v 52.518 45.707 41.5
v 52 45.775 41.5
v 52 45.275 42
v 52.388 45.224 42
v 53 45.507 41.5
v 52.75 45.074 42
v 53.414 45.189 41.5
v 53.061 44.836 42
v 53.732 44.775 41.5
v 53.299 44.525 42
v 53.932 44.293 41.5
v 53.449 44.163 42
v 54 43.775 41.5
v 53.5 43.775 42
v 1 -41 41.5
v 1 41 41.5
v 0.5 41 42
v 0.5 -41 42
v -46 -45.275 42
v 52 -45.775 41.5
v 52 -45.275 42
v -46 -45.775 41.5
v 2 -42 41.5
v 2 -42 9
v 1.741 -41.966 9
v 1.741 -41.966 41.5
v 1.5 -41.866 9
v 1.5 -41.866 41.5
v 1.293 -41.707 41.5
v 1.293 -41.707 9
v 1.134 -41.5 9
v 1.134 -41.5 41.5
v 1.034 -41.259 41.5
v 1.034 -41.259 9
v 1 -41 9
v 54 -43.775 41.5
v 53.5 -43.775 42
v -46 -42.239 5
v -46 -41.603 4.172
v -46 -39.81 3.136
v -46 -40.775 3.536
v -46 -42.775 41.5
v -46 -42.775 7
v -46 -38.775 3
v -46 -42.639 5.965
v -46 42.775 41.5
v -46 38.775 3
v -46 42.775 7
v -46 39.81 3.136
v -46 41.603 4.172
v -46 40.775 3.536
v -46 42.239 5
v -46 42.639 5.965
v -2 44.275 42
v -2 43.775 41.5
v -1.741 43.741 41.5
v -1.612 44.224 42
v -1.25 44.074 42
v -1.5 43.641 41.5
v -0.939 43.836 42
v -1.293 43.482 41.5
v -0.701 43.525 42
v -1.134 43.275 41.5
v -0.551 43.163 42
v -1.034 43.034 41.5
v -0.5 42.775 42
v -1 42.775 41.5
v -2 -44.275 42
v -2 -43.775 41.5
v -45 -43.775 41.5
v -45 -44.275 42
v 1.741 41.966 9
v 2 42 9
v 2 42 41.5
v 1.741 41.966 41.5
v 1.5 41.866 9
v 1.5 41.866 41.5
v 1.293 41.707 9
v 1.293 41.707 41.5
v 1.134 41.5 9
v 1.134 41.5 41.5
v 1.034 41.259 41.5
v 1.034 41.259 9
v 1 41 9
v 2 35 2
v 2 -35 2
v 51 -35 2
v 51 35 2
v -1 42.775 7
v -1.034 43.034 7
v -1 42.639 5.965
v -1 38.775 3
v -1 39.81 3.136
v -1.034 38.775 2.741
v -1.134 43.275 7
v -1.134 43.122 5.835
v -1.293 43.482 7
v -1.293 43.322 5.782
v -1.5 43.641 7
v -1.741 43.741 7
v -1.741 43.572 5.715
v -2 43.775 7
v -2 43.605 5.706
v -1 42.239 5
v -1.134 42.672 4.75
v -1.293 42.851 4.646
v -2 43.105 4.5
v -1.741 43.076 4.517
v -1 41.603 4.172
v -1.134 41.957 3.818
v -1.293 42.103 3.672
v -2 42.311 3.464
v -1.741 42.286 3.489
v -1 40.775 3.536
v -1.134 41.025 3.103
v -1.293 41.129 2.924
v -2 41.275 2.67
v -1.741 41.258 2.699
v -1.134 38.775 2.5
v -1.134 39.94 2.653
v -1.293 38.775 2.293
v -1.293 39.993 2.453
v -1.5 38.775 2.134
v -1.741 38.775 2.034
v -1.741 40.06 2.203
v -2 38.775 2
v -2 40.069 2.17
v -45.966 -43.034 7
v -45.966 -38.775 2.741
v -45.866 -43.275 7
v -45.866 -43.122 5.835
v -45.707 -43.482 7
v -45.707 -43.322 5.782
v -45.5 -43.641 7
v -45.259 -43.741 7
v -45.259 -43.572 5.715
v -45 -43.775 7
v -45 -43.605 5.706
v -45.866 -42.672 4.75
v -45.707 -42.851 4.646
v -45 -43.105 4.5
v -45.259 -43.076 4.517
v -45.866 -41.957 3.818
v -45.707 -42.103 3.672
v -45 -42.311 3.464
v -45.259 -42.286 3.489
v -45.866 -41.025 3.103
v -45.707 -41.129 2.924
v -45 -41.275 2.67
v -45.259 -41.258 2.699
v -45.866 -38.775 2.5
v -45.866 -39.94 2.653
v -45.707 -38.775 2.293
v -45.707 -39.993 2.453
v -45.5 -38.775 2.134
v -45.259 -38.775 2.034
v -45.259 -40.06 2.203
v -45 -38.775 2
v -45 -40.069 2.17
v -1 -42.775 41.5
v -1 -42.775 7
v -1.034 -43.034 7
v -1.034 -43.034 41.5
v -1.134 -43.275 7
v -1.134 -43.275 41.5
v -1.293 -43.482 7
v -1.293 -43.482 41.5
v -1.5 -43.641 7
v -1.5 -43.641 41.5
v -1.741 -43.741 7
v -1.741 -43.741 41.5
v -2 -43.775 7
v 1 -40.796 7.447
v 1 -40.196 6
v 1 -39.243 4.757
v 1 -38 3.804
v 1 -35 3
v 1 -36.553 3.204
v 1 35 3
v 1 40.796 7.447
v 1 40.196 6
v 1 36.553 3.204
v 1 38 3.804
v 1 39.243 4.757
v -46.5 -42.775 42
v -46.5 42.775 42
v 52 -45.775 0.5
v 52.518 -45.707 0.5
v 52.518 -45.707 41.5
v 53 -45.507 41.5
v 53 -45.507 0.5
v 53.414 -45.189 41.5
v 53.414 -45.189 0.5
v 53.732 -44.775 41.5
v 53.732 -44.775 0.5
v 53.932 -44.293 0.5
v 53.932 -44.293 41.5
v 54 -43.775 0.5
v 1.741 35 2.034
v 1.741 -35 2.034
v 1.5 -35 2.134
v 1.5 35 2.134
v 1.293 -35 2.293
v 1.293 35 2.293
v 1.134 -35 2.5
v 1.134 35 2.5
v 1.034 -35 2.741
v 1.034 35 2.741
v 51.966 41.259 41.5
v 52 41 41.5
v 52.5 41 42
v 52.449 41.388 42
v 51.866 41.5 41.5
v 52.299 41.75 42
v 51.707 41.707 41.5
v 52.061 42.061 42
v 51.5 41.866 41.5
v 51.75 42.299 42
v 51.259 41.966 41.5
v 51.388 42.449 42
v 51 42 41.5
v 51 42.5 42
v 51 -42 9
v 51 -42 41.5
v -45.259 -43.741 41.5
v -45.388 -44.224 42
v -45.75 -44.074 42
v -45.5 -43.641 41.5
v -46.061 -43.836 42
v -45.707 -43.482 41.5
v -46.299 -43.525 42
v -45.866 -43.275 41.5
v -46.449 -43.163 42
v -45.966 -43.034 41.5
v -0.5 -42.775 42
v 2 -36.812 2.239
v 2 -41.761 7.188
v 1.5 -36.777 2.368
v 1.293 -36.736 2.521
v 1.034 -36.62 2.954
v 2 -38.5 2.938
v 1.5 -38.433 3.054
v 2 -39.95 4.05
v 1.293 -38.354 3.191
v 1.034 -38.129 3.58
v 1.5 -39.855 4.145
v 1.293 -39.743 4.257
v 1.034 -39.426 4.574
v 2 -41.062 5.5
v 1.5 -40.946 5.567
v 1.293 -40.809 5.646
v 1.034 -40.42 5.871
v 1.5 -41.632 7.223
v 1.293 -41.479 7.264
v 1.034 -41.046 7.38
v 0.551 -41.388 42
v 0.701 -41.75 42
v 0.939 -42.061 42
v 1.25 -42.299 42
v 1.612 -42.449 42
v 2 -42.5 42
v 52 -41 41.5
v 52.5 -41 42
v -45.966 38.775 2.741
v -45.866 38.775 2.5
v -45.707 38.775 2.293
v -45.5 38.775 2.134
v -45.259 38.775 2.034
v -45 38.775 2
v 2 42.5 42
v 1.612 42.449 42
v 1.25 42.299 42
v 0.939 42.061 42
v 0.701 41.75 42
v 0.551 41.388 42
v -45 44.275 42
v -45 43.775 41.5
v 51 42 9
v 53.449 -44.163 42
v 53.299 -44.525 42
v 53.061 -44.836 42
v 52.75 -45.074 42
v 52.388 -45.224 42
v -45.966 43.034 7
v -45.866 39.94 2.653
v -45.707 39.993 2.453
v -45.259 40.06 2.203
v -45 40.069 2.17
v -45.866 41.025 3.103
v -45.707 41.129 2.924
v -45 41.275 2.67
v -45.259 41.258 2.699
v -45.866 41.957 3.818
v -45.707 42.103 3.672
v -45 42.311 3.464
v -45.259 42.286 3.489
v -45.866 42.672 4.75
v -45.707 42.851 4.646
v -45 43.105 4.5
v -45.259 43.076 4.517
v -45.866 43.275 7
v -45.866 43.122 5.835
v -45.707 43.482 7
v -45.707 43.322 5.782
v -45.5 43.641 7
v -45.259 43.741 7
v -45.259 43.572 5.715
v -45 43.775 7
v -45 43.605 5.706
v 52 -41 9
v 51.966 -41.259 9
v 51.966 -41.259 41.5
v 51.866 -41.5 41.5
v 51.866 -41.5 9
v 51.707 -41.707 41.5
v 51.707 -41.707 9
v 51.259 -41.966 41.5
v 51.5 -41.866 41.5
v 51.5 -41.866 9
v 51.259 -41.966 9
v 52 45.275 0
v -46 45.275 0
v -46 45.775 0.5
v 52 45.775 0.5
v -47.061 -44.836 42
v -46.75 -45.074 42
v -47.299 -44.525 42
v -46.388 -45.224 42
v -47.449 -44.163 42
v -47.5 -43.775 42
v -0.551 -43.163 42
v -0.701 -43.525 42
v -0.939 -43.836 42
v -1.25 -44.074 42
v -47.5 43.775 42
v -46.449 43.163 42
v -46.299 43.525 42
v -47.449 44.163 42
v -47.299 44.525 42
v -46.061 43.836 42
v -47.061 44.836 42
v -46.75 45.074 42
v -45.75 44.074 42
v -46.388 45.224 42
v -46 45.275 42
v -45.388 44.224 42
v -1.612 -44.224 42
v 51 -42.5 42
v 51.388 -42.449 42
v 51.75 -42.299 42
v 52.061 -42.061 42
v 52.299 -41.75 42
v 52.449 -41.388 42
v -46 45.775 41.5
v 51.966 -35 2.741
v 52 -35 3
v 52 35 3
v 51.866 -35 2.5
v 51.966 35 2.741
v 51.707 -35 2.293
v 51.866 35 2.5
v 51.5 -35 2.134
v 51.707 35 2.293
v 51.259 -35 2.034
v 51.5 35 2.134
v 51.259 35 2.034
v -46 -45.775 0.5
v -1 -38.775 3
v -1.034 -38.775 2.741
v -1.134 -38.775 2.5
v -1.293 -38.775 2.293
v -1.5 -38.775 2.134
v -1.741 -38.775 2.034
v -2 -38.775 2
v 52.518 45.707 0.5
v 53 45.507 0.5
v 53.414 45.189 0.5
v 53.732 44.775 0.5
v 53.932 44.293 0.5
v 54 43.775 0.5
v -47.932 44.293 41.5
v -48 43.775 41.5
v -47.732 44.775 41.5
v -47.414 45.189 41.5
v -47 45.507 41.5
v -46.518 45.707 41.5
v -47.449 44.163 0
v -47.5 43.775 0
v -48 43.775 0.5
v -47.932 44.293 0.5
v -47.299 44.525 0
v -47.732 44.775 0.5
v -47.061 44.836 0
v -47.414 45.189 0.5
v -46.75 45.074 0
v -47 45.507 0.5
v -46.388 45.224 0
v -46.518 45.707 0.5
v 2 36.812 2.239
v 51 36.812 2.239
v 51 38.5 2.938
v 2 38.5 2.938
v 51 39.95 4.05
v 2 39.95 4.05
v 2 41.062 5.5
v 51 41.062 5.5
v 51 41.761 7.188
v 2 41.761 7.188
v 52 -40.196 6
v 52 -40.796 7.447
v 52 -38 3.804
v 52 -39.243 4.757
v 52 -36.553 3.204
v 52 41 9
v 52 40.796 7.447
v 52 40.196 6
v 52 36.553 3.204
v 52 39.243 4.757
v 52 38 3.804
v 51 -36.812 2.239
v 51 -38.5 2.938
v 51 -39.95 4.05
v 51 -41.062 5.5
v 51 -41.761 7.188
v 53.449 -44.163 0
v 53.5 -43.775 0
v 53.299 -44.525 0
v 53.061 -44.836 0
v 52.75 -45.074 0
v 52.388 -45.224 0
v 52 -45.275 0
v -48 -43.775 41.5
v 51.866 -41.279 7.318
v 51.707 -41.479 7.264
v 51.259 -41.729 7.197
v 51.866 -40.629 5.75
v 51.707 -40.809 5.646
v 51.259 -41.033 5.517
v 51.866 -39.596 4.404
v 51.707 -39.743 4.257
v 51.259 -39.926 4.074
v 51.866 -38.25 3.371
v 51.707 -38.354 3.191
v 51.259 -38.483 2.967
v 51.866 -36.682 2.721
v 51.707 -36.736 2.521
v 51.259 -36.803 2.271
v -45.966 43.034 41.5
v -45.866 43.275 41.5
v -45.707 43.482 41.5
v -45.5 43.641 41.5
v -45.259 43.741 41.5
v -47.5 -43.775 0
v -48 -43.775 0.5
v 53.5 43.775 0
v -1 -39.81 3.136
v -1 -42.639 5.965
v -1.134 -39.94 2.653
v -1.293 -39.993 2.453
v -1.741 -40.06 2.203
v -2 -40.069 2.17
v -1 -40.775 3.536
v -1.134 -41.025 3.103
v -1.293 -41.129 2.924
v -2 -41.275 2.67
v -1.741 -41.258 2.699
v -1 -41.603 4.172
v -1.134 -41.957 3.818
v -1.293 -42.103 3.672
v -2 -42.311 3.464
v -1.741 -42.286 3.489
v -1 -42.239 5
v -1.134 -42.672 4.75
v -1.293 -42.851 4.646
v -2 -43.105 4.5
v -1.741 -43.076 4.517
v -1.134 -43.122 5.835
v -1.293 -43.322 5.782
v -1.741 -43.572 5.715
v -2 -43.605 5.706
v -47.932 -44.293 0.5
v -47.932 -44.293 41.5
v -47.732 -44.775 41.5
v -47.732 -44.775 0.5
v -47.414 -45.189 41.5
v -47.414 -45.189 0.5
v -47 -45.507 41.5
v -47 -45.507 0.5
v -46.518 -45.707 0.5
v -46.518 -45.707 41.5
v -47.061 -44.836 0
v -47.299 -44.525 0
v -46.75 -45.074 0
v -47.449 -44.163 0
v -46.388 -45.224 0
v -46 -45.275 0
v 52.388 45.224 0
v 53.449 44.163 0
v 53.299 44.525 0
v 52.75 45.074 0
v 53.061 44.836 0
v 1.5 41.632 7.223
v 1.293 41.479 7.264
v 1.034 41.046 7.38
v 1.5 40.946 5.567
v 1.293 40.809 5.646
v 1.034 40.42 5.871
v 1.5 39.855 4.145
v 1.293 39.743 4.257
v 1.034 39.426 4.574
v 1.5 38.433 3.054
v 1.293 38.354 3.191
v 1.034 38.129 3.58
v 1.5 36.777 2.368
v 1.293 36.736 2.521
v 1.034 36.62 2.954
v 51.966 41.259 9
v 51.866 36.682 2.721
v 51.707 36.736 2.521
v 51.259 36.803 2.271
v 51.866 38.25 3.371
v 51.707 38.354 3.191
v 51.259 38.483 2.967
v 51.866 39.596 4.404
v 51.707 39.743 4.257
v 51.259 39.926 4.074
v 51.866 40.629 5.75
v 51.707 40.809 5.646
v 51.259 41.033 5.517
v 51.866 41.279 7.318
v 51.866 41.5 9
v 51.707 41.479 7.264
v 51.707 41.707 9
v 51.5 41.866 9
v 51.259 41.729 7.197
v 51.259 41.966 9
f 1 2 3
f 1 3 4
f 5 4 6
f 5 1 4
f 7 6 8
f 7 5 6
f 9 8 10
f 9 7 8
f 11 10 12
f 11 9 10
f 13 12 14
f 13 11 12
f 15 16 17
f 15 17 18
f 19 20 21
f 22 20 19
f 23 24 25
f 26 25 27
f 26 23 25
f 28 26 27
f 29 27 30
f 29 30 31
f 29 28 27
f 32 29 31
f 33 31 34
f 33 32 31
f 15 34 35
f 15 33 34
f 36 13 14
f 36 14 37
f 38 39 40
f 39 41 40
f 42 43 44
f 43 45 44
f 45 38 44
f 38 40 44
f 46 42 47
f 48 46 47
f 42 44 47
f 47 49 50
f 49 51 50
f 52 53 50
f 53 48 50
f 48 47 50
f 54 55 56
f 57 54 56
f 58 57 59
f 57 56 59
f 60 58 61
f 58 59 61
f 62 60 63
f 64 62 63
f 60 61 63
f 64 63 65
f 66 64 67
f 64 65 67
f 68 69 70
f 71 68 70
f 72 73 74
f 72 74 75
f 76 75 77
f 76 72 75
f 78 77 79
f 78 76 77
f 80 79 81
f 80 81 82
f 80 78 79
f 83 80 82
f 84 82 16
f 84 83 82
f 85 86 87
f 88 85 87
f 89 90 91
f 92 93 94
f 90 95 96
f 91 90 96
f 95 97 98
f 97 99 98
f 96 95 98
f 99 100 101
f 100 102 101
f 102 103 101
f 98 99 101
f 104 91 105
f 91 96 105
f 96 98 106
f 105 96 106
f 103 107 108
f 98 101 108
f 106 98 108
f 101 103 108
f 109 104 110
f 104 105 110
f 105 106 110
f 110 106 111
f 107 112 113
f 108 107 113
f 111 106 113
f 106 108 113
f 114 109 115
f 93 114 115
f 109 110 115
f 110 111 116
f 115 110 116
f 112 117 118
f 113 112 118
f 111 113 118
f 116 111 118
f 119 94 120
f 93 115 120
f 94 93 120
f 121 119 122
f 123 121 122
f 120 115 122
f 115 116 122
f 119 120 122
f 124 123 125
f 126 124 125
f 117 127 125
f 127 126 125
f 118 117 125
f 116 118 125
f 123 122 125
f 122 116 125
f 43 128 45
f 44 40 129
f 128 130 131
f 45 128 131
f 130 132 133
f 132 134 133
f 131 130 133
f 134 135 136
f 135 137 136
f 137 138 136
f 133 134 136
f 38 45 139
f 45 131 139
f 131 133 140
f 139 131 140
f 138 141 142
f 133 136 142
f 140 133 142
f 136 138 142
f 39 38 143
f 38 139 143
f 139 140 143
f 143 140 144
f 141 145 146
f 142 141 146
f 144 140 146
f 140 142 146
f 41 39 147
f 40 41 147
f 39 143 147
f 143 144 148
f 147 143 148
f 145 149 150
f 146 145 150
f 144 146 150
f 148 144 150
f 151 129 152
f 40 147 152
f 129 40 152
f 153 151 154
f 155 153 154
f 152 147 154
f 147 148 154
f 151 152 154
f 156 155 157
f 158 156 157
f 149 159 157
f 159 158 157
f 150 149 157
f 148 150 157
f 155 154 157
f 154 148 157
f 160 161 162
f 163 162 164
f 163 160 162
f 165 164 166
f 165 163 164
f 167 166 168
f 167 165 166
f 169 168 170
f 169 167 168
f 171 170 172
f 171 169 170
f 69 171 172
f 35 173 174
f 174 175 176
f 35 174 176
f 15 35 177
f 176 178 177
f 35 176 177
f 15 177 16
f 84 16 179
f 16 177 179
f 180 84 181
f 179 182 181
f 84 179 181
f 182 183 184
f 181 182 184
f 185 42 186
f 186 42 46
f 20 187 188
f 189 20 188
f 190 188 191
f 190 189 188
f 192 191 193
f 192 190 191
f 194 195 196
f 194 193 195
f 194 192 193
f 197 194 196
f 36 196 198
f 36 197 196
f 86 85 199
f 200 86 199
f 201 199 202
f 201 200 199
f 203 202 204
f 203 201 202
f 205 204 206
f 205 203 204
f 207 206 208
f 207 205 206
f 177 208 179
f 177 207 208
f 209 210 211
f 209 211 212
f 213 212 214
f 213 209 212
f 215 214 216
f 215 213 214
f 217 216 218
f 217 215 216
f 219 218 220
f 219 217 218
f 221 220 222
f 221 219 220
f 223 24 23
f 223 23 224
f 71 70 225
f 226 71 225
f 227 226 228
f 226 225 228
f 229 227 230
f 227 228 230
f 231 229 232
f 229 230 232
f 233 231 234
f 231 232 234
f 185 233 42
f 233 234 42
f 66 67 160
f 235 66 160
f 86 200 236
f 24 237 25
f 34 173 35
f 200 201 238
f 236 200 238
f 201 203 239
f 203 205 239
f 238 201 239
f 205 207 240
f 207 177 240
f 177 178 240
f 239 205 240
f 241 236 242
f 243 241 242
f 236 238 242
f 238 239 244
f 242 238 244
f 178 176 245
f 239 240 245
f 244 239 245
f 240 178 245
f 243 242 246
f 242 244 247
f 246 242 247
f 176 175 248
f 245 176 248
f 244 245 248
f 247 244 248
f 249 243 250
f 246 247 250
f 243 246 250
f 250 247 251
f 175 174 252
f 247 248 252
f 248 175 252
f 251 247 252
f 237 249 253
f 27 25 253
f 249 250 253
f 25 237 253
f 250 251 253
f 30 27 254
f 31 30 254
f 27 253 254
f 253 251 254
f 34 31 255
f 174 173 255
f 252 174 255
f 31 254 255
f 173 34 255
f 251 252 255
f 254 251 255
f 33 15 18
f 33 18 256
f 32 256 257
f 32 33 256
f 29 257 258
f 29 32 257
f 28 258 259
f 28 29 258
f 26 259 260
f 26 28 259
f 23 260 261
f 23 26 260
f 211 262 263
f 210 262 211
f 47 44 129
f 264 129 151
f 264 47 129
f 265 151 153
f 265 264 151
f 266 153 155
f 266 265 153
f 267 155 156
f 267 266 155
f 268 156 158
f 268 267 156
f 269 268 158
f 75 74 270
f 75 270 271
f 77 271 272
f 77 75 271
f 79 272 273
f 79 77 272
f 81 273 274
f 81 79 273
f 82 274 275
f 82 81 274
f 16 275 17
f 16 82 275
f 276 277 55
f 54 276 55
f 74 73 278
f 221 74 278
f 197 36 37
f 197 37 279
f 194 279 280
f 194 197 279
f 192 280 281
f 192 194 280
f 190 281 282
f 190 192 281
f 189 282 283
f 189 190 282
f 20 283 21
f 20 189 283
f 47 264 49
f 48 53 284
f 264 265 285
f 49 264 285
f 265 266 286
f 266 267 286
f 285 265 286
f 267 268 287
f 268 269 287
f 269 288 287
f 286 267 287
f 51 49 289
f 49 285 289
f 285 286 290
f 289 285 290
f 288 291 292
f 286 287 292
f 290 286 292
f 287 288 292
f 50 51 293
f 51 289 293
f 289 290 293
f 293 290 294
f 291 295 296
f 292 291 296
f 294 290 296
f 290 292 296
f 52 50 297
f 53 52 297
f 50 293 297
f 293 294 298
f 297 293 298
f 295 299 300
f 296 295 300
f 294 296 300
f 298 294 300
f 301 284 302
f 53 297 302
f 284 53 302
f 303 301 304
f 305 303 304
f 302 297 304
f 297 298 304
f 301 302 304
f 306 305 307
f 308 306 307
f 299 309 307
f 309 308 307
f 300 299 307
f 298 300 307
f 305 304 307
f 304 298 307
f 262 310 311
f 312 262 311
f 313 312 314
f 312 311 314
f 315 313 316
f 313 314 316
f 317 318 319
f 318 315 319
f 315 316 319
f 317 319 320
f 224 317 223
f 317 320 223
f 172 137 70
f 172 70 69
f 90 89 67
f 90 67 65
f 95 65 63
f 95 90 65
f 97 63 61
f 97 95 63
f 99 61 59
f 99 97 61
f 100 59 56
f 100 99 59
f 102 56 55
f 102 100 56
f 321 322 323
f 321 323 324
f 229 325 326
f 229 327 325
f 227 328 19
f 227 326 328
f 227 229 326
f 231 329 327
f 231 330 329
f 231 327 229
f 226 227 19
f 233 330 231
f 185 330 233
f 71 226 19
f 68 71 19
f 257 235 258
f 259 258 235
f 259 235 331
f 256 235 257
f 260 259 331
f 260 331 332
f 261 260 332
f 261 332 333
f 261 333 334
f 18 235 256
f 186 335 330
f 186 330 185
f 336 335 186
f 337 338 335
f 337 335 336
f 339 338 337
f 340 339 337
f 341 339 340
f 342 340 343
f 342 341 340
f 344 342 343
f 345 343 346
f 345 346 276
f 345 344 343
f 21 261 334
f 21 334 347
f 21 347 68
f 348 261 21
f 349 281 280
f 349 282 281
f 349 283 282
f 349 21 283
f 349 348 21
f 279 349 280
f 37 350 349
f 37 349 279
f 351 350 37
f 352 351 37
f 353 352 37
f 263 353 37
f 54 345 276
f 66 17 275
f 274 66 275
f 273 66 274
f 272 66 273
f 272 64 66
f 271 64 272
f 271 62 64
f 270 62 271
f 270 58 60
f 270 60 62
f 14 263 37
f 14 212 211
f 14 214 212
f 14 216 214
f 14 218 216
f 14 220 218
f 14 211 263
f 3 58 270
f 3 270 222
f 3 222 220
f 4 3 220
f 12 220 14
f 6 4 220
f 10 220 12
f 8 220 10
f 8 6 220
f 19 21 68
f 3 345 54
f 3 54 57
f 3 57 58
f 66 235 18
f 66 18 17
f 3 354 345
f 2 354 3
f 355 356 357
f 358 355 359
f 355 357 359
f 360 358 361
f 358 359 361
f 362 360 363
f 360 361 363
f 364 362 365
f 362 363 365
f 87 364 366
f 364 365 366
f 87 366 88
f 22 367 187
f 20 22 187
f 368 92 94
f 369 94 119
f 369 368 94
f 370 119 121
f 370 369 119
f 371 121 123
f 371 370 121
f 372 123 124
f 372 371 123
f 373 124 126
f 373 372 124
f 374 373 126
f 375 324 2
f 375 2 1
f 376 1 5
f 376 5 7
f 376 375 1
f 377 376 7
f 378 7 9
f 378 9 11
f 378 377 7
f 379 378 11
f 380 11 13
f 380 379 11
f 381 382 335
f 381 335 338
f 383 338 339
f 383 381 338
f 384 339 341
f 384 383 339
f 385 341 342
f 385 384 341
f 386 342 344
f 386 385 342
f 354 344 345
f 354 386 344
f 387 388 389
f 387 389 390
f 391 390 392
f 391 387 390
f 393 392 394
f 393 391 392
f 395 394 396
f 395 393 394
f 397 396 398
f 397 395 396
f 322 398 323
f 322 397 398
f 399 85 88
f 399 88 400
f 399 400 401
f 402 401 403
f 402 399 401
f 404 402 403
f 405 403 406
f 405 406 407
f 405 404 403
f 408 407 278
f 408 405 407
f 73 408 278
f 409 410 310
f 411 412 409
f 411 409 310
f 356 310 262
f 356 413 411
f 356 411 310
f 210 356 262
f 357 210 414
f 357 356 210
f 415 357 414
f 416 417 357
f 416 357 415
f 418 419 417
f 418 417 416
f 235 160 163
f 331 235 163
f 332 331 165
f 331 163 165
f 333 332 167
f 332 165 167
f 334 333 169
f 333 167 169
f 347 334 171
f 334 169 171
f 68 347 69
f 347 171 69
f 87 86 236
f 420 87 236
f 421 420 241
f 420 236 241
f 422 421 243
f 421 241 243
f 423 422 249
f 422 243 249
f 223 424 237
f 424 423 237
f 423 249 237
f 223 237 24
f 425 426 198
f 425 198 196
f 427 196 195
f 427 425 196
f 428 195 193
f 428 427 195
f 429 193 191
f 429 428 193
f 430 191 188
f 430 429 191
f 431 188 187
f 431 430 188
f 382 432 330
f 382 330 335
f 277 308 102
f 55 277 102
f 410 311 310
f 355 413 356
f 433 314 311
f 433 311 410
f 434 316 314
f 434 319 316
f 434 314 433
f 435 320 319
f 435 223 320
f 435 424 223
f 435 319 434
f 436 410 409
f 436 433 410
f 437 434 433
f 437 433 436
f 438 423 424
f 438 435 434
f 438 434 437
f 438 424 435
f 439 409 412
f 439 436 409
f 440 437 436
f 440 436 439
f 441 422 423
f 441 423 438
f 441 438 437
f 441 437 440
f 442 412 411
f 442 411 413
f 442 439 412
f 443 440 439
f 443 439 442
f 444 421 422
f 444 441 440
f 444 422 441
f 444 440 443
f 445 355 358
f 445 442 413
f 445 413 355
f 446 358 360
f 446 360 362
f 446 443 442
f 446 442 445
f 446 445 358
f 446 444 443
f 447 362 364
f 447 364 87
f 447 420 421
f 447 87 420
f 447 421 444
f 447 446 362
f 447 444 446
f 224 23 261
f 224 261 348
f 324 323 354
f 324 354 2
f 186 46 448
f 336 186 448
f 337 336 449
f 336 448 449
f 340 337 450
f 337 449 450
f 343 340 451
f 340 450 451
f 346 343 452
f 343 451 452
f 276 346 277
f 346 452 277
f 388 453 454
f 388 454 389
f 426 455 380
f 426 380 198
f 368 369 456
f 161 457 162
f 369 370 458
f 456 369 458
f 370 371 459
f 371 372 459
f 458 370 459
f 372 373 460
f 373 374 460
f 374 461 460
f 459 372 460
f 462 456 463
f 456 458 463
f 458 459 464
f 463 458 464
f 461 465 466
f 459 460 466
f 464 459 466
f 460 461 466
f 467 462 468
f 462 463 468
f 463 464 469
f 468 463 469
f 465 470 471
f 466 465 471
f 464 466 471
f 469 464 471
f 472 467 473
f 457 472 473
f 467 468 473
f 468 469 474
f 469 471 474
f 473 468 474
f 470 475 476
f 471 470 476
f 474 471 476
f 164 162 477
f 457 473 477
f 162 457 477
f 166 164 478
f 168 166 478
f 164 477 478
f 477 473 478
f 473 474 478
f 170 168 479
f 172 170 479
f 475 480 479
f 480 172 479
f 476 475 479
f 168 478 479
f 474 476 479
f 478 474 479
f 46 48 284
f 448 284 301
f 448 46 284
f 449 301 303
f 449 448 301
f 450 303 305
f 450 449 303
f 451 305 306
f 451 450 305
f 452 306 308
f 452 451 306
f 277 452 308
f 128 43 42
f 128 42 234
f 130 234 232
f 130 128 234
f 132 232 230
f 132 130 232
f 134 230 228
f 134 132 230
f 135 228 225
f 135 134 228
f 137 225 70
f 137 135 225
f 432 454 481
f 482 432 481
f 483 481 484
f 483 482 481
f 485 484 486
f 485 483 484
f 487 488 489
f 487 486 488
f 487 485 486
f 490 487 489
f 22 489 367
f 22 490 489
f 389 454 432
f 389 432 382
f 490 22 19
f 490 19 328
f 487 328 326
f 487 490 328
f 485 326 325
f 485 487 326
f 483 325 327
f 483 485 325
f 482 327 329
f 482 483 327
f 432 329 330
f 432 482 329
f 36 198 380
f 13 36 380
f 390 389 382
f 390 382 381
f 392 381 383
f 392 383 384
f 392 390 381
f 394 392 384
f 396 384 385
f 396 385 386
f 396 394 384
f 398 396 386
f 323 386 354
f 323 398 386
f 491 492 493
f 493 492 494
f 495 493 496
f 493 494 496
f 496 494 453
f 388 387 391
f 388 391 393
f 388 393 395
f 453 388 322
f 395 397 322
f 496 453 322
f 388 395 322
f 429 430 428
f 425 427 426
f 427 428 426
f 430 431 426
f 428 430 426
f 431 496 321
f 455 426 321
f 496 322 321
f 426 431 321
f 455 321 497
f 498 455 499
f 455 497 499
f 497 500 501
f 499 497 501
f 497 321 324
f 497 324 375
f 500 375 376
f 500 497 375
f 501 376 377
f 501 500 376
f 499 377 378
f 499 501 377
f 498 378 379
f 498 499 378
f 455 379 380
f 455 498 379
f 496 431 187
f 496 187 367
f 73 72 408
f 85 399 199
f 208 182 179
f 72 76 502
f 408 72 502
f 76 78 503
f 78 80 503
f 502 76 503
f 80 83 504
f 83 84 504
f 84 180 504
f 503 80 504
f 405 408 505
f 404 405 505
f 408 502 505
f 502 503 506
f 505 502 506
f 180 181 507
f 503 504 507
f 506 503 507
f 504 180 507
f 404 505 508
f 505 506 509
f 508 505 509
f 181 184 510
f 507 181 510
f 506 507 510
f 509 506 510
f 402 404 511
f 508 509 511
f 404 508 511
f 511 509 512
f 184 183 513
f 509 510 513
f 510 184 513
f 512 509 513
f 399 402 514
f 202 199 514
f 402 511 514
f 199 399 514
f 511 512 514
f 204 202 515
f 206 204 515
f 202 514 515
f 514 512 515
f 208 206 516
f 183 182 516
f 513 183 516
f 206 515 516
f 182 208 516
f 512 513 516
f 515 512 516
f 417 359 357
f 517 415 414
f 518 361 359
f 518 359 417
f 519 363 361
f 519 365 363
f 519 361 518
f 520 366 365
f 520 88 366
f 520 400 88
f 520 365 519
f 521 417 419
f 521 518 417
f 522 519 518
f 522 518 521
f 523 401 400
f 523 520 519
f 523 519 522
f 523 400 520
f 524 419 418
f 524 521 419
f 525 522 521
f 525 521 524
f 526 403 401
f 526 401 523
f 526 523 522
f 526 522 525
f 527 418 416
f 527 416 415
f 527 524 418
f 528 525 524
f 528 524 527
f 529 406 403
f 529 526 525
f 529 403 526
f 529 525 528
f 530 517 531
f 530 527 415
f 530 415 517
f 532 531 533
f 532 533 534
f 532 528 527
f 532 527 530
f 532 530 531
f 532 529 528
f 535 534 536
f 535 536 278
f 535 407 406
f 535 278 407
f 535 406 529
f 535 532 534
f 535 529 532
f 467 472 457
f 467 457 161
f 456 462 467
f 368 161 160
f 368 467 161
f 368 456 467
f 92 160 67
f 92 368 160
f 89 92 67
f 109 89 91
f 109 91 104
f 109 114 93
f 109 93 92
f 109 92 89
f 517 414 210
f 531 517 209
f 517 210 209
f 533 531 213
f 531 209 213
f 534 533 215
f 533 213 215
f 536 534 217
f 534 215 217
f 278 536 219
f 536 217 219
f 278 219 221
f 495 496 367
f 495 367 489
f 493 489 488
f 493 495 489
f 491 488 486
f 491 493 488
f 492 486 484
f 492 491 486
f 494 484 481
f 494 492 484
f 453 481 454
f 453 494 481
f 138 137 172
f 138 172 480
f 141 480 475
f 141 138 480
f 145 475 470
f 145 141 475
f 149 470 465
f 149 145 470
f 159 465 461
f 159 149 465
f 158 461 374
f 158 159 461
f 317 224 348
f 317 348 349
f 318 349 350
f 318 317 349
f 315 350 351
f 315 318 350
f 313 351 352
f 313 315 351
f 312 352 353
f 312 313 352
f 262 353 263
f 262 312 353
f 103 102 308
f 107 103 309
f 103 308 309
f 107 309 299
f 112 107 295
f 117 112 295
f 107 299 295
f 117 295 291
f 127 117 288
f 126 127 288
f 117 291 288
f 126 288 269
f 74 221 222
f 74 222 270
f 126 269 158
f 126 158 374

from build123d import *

# Parameters (mm, degrees)
F0_W     = 102
F0_H     = 91.55
F0_W_2   = 45
F0_H_2   = 87.55
F0_W_3   = 51
F0_H_3   = 84
F1_DEPTH = 2
F2_DEPTH = 42
F3_R     = 7
F4_R     = 5
F5_R     = 2
F6_SIZE  = 0.5
F7_R     = 1
F8_SIZE  = 0.5


with BuildPart() as f1:
    # F0 (on Top) → F1 (new body)
    with BuildSketch(Plane.XY):
        with Locations((3, 0)):
            Rectangle(F0_W, F0_H)
        with Locations((-23.5, 0)):
            Rectangle(F0_W_2, F0_H_2, mode=Mode.SUBTRACT)
        with Locations((26.5, 0)):
            Rectangle(F0_W_3, F0_H_3, mode=Mode.SUBTRACT)
        with Locations((-23.5, 0)):
            Rectangle(F0_W_2, F0_H_2)
        with Locations((26.5, 0)):
            Rectangle(F0_W_3, F0_H_3)
    extrude(amount=F1_DEPTH)

    # F0 (on Top) → F2 (join)
    with BuildSketch(Plane.XY):
        with Locations((3, 0)):
            Rectangle(F0_W, F0_H)
        with Locations((-23.5, 0)):
            Rectangle(F0_W_2, F0_H_2, mode=Mode.SUBTRACT)
        with Locations((26.5, 0)):
            Rectangle(F0_W_3, F0_H_3, mode=Mode.SUBTRACT)
    extrude(amount=F2_DEPTH)

    # F3
    f3_edges = [f1.edges().sort_by_distance(p)[0] for p in [
        (26.5, 42, 2),
        (26.5, -42, 2),
    ]]
    fillet(f3_edges, radius=F3_R)

    # F4
    f4_edges = [f1.edges().sort_by_distance(p)[0] for p in [
        (-23.5, 43.775, 2),
        (-23.5, -43.775, 2),
    ]]
    fillet(f4_edges, radius=F4_R)

    # F5
    f5_edges = [f1.edges().sort_by_distance(p)[0] for p in [
        (54, -45.775, 21),
        (54, 45.775, 21),
        (-48, 45.775, 21),
        (-48, -45.775, 21),
    ]]
    fillet(f5_edges, radius=F5_R)

    # F6
    f6_edges = [f1.edges().sort_by_distance(p)[0] for p in [
        (-48, 0, 0),
        (-47.414214, 45.189214, 0),
        (-47.414214, -45.189214, 0),
        (3, 45.775, 0),
        (3, -45.775, 0),
        (53.414214, 45.189214, 0),
        (53.414214, -45.189214, 0),
        (54, 0, 0),
    ]]
    chamfer(f6_edges, length=F6_SIZE)

    # F7
    f7_edges = [f1.edges().sort_by_distance(p)[0] for p in [
        (-46, 43.775, 24.5),
        (-1, 0, 2),
        (1, -42, 25.5),
        (52, 42, 25.5),
    ]]
    fillet(f7_edges, radius=F7_R)

    # F8
    f8_edges = [f1.edges().sort_by_distance(p)[0] for p in [
        (-46, 0, 42),
        (-45.707107, -43.482107, 42),
        (-45.707107, 43.482107, 42),
        (-23.5, -43.775, 42),
        (-23.5, 43.775, 42),
        (-1.292893, -43.482107, 42),
        (-1.292893, 43.482107, 42),
        (-1, 0, 42),
        (-48, 0, 42),
        (-47.414214, 45.189214, 42),
        (-47.414214, -45.189214, 42),
        (3, 45.775, 42),
        (3, -45.775, 42),
        (53.414214, 45.189214, 42),
        (53.414214, -45.189214, 42),
        (54, 0, 42),
        (26.5, -42, 42),
        (51.707107, -41.707107, 42),
        (1.292893, -41.707107, 42),
        (52, 0, 42),
        (1, 0, 42),
        (51.707107, 41.707107, 42),
        (1.292893, 41.707107, 42),
        (26.5, 42, 42),
    ]]
    chamfer(f8_edges, length=F8_SIZE)


solid = f1.part
